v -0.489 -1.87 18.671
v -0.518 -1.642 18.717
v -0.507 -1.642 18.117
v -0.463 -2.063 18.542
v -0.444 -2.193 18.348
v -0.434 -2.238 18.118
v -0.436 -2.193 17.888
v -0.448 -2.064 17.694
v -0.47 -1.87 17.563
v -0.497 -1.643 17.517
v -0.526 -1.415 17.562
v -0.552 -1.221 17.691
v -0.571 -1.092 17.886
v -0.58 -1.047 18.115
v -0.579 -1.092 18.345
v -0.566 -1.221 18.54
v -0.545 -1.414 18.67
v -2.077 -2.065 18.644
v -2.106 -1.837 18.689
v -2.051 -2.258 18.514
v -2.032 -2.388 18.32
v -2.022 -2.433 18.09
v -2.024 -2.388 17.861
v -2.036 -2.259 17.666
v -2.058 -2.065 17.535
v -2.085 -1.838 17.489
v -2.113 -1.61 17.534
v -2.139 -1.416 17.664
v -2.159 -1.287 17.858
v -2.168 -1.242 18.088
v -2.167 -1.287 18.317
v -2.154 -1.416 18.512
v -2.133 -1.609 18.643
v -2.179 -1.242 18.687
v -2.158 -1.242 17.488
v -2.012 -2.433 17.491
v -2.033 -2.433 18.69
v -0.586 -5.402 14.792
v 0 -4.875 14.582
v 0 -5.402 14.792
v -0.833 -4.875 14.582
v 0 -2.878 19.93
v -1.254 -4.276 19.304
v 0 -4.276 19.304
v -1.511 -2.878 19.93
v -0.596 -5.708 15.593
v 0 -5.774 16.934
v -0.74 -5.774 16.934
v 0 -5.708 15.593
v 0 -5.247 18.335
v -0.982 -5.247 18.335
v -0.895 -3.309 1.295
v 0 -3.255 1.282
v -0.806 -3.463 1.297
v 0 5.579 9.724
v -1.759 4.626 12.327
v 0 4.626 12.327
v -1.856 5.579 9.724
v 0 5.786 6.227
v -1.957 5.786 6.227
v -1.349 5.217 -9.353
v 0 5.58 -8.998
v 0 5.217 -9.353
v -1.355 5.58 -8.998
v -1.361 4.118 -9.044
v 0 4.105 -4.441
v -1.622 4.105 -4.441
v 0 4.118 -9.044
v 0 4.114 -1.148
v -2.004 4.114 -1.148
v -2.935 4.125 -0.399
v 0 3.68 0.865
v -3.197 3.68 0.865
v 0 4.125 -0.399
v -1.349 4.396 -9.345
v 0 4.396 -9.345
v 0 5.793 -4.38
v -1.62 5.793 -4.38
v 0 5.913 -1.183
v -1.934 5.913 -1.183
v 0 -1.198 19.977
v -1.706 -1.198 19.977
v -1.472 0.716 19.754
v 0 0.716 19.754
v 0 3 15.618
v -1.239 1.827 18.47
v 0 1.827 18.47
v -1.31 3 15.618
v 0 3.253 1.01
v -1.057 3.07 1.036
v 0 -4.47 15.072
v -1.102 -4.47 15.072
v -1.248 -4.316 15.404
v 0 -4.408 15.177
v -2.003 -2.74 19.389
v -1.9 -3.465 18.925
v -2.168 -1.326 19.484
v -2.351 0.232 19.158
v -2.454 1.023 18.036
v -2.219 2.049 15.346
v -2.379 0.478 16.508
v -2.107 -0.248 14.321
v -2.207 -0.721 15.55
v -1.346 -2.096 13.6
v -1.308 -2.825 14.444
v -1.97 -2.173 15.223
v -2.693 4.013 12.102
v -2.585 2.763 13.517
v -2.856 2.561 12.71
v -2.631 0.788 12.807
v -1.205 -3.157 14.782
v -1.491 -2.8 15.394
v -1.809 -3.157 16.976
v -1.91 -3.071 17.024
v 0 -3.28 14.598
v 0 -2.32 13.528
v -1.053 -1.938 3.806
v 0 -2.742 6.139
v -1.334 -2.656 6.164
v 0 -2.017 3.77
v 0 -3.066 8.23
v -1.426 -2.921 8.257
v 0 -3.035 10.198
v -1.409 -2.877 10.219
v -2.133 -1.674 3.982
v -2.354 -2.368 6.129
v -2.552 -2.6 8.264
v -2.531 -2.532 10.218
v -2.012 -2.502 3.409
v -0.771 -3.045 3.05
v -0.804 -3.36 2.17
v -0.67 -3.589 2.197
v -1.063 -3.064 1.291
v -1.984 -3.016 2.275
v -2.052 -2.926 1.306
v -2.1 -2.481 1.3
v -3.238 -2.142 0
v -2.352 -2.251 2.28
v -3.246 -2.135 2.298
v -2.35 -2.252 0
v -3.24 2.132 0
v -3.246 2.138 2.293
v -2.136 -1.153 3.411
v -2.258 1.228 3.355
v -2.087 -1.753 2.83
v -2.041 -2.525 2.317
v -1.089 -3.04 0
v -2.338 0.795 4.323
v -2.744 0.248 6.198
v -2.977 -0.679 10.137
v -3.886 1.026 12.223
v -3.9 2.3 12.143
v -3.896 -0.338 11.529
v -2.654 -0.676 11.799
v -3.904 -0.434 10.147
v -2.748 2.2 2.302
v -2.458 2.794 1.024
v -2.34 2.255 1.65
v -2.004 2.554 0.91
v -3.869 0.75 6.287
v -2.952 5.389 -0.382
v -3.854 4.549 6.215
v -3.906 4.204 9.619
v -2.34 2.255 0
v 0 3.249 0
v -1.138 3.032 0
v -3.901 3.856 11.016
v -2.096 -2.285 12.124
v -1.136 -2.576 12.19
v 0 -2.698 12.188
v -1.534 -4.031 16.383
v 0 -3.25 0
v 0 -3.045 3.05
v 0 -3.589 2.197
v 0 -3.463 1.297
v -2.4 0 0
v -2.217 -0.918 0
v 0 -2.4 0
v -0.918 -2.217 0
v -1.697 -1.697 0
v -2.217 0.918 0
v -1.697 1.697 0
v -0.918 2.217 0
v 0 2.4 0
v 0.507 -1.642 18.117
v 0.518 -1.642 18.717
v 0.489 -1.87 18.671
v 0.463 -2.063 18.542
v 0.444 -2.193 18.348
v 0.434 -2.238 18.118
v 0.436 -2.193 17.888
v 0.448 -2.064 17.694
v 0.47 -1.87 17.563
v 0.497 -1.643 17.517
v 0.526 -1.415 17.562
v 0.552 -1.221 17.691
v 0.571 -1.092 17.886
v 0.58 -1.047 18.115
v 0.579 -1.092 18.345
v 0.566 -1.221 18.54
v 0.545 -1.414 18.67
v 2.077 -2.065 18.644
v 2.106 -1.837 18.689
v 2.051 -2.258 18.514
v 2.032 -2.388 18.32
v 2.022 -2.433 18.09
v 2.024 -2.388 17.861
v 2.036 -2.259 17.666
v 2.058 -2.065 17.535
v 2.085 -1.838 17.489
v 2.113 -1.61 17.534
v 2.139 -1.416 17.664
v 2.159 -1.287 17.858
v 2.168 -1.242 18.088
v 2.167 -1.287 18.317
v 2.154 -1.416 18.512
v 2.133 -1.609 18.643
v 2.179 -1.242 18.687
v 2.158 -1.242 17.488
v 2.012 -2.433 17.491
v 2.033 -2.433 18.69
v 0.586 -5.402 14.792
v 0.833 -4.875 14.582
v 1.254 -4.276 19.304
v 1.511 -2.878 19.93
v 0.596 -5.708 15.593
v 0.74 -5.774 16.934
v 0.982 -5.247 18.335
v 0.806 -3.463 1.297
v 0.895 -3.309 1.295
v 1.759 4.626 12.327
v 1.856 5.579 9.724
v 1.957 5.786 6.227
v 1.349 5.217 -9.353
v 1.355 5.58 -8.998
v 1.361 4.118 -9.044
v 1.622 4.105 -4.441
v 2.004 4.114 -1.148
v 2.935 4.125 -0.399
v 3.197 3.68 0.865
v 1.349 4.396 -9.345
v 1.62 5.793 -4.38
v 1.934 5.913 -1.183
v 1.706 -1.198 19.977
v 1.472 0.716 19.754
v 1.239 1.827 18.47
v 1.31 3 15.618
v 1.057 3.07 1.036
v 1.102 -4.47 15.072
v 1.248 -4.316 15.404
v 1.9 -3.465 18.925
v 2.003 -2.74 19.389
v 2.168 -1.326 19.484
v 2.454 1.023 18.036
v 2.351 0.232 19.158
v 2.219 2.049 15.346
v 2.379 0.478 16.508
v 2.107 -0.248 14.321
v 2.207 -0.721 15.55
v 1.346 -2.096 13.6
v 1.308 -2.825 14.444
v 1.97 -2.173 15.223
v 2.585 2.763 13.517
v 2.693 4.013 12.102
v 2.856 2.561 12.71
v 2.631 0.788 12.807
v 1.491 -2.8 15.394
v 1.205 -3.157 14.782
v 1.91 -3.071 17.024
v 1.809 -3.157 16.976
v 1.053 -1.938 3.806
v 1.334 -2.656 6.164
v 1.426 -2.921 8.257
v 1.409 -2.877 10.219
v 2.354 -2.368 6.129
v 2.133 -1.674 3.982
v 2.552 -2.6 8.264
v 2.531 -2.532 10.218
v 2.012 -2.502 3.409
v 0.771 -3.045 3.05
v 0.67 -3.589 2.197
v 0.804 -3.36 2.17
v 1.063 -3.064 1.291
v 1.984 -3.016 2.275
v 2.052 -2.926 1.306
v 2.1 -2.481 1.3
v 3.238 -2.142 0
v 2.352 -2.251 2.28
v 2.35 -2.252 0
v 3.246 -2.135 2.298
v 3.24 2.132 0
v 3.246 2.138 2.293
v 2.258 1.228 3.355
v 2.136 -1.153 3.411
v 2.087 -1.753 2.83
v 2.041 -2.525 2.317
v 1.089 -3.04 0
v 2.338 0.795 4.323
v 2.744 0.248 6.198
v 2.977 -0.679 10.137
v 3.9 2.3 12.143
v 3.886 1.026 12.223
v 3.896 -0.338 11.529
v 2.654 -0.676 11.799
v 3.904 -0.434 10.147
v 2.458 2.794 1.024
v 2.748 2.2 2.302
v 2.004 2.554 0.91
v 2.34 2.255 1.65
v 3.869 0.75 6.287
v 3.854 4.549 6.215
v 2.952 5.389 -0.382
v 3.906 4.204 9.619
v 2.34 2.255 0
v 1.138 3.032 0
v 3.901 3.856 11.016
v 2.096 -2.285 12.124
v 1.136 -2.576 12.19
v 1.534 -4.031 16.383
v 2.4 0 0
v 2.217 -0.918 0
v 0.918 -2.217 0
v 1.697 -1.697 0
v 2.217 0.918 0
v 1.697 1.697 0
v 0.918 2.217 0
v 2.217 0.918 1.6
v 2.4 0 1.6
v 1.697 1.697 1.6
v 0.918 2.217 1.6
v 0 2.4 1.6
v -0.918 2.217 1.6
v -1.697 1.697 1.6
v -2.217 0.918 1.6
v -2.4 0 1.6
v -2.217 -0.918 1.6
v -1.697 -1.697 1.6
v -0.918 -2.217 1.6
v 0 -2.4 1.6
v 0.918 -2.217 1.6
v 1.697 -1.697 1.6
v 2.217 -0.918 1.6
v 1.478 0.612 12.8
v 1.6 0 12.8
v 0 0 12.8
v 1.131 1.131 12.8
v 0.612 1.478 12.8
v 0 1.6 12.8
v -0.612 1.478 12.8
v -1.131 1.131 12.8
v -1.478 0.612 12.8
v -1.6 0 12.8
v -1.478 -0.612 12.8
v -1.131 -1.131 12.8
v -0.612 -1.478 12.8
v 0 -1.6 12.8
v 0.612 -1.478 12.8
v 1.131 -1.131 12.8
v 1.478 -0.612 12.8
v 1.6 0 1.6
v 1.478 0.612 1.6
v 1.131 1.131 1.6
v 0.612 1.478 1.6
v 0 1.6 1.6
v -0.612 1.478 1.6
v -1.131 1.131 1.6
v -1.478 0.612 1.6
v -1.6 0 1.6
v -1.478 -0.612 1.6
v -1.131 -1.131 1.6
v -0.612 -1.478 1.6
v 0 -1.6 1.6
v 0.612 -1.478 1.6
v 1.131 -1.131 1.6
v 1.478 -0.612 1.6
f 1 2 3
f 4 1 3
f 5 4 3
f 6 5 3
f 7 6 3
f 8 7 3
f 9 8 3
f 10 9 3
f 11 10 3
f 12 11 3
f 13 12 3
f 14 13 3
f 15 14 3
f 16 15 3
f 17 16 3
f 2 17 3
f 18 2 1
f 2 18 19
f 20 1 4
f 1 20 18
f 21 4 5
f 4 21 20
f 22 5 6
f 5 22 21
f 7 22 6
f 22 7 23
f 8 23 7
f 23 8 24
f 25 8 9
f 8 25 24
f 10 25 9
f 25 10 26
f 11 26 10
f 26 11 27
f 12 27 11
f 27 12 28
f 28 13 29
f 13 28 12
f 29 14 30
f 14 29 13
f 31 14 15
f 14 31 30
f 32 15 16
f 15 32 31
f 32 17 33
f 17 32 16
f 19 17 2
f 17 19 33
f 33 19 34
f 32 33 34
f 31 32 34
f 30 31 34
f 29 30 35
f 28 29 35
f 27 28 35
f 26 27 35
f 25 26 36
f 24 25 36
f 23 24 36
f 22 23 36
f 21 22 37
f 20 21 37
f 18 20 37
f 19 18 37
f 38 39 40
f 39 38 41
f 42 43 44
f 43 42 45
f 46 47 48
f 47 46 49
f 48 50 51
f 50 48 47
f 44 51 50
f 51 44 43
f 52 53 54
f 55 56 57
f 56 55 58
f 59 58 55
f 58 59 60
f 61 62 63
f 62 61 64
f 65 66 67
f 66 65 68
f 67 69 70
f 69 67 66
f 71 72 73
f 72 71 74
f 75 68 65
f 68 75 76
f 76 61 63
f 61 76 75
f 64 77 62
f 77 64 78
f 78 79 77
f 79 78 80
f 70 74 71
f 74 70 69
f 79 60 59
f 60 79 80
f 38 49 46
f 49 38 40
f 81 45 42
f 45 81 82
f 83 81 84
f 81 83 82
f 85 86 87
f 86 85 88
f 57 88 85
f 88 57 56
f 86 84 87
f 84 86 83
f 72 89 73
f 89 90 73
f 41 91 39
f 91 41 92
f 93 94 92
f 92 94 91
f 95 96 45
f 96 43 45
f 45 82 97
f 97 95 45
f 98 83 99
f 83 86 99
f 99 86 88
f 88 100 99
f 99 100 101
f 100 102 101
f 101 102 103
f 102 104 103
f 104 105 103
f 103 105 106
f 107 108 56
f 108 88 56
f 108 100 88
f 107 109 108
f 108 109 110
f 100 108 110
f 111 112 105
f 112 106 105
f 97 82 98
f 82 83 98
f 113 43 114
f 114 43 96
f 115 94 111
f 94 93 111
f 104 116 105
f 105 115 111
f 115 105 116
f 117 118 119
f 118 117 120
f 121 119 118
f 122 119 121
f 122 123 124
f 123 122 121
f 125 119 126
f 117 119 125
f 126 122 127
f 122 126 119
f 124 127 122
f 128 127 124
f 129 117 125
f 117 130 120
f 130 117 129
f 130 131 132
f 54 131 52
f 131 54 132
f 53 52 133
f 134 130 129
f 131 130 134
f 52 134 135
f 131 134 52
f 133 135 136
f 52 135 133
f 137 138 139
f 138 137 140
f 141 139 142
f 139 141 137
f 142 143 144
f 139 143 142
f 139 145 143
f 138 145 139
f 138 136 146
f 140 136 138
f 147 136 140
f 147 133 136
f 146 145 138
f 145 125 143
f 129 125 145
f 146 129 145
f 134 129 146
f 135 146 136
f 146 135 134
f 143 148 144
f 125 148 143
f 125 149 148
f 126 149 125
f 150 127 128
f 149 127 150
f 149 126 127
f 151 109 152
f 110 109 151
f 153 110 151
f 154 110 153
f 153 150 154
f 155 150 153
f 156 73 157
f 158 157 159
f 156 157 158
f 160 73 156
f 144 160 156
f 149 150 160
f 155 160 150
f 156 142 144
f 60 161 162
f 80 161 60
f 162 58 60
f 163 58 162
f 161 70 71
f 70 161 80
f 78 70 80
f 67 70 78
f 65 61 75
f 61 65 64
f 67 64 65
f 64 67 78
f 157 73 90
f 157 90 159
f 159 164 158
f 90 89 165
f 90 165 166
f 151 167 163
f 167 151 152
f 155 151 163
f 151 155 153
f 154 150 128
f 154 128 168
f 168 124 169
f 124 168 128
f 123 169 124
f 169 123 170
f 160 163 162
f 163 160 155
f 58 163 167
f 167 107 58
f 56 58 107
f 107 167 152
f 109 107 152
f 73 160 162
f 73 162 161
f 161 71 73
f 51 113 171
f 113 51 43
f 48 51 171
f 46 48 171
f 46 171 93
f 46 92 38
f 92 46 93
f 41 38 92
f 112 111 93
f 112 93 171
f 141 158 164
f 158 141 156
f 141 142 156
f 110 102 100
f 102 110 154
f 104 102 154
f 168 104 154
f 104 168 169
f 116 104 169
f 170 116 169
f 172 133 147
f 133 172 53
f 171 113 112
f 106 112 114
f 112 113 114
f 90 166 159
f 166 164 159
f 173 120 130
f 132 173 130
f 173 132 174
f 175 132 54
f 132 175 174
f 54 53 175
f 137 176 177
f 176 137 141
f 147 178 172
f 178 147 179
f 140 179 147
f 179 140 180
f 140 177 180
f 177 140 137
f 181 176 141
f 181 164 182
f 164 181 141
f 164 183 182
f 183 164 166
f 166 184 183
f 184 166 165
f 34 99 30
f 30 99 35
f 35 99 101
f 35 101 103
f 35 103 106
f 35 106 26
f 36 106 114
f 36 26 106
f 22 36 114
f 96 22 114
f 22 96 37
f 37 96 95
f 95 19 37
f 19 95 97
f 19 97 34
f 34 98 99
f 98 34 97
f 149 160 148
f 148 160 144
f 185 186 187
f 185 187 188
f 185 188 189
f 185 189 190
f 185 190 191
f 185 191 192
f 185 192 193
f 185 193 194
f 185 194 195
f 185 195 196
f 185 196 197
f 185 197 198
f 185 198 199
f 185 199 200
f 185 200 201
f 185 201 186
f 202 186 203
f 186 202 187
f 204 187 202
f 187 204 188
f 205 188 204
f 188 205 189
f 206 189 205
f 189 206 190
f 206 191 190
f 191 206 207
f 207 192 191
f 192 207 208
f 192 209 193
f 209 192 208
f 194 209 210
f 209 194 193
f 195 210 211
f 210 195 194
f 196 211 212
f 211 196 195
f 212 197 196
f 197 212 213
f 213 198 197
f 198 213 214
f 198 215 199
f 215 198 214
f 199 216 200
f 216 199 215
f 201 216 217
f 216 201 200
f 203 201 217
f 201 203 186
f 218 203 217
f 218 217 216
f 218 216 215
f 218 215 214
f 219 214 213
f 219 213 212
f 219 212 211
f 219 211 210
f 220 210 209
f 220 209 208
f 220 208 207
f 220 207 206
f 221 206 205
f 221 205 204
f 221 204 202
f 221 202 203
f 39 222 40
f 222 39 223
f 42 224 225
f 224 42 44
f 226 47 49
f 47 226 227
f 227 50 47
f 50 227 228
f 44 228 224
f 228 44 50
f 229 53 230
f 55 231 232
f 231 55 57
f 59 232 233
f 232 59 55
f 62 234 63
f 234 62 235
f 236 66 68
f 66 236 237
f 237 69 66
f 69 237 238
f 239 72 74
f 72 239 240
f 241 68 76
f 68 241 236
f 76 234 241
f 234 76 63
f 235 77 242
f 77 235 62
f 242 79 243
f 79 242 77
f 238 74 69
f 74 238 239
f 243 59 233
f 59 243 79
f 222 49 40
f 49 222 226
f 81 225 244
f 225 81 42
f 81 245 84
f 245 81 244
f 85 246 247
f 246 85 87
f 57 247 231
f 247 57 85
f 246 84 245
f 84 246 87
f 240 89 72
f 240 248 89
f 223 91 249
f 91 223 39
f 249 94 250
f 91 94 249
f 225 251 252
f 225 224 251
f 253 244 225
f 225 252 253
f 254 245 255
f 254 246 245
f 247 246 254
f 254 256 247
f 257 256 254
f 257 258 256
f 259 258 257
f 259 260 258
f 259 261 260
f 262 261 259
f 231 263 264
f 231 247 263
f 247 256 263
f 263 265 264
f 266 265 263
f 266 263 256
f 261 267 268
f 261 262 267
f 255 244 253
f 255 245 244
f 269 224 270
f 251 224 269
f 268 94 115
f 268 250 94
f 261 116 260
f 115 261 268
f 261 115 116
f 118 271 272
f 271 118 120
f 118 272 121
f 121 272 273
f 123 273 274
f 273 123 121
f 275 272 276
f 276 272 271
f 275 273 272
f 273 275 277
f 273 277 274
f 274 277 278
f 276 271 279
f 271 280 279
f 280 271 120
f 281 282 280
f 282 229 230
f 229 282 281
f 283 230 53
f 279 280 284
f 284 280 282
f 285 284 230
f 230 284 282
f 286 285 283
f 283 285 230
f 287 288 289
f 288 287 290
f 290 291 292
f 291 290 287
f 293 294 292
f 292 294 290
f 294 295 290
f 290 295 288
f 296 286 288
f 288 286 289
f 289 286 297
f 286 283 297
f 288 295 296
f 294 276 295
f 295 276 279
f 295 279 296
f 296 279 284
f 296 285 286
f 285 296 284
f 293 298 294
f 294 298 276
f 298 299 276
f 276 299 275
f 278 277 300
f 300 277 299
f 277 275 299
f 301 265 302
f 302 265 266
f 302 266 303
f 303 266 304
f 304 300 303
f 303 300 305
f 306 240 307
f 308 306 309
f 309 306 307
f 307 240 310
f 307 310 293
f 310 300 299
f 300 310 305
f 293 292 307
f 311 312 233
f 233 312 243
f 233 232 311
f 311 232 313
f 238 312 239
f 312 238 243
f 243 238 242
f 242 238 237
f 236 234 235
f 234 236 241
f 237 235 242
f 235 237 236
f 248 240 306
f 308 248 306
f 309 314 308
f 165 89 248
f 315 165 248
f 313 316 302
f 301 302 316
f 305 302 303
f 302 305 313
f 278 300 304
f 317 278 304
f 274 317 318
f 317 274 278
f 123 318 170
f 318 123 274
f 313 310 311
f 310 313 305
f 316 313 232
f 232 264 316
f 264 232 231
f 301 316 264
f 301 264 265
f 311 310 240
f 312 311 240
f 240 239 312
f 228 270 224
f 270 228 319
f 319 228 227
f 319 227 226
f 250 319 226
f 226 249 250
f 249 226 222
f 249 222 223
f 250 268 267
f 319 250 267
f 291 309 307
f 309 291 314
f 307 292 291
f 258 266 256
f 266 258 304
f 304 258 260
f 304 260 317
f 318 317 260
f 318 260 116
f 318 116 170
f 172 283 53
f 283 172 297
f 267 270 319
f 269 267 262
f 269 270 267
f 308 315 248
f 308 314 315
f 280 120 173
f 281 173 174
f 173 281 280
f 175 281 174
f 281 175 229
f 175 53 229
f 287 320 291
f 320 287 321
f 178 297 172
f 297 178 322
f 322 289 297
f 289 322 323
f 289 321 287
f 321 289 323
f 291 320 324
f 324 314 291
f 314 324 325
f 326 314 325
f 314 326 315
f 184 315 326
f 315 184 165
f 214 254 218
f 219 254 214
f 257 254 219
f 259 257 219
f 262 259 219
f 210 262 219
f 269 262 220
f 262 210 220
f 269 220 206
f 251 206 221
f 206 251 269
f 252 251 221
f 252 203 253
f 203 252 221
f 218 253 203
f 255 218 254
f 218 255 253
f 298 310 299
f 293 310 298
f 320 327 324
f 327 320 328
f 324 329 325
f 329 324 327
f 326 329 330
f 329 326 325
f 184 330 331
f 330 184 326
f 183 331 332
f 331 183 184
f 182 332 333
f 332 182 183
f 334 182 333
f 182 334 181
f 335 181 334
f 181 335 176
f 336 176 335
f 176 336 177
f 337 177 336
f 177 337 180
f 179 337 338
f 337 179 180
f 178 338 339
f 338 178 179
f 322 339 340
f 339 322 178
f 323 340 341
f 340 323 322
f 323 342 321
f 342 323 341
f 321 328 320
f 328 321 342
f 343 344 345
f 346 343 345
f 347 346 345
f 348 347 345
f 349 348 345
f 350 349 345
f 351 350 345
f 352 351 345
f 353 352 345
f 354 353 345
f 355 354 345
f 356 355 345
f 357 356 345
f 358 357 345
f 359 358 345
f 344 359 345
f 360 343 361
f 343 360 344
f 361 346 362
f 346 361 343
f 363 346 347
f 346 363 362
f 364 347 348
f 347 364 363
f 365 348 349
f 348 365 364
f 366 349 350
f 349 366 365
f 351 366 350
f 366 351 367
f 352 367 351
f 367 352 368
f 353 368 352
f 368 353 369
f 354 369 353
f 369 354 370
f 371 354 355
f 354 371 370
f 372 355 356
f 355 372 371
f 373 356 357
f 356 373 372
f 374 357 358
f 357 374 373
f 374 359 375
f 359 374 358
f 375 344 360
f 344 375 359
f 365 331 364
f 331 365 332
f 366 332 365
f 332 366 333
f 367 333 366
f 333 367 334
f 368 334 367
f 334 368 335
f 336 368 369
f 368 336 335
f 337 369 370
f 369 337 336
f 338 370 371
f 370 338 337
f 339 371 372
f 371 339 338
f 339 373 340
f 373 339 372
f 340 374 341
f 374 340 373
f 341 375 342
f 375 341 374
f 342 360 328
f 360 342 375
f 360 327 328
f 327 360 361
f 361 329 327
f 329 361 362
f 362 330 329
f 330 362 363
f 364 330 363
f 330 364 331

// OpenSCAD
use <../lib.scad>
use <../p/4-4cylc.scad>
use <../p/4-4cylo.scad>
use <../p/4-4ring2.scad>
use <s/27063s01.scad>
function ldraw_lib__27063() = [
// 0 Animal Bird Parrot with Large Beak
// 0 Name: 27063.dat
// 0 Author: Evert-Jan Boer [ejboer]
// 0 !LDRAW_ORG Part UPDATE 2024-05
// 0 !LICENSE Licensed under CC BY 4.0 : see CAreadme.txt
// 
// 0 BFC CERTIFY CCW
  [0,"BFC","CERTIFY"],
  [0,"BFC","CCW"],
// 
// 0 !HISTORY 2021-03-19 {LEGO/Unity Microgame} Original part shape
// 0 !HISTORY 2022-01-18 [ejboer] File preparation for LDraw Parts Tracker
// 0 !HISTORY 2024-06-30 [OrionP] Official Update 2024-05
// 
// 
// 1 16 0 0 0 1 0 0 0 1 0 0 0 1 s\27063s01.dat
  [1,16,0,0,0,1,0,0,0,1,0,0,0,1, ldraw_lib__s__27063s01()],
// 1 16 0 0 0 -1 0 0 0 1 0 0 0 1 s\27063s01.dat
  [1,16,0,0,0,-1,0,0,0,1,0,0,0,1, ldraw_lib__s__27063s01()],
// 0 BFC INVERTNEXT
  [0,"BFC","INVERTNEXT"],
// 1 16 0 -4 0 6 0 0 0 4 0 0 0 6 4-4cylo.dat
  [1,16,0,-4,0,6,0,0,0,4,0,0,0,6, ldraw_lib__4_4cylo()],
// 0 BFC INVERTNEXT
  [0,"BFC","INVERTNEXT"],
// 1 16 0 -32 0 4 0 0 0 28 0 0 0 4 4-4cylc.dat
  [1,16,0,-32,0,4,0,0,0,28,0,0,0,4, ldraw_lib__4_4cylc()],
// 1 16 0 -4 0 2 0 0 0 -1 0 0 0 2 4-4ring2.dat
  [1,16,0,-4,0,2,0,0,0,-1,0,0,0,2, ldraw_lib__4_4ring2()],
];
module ldraw_lib__27063(step=0, col=false, unit=2/5, alt=false, line=0.2, solid=!$preview)
    makepoly(ldraw_lib__27063(), step=step, col=col, unit=unit, alt=alt, line=line, solid=solid);
ldraw_lib__27063(line=0.2);
